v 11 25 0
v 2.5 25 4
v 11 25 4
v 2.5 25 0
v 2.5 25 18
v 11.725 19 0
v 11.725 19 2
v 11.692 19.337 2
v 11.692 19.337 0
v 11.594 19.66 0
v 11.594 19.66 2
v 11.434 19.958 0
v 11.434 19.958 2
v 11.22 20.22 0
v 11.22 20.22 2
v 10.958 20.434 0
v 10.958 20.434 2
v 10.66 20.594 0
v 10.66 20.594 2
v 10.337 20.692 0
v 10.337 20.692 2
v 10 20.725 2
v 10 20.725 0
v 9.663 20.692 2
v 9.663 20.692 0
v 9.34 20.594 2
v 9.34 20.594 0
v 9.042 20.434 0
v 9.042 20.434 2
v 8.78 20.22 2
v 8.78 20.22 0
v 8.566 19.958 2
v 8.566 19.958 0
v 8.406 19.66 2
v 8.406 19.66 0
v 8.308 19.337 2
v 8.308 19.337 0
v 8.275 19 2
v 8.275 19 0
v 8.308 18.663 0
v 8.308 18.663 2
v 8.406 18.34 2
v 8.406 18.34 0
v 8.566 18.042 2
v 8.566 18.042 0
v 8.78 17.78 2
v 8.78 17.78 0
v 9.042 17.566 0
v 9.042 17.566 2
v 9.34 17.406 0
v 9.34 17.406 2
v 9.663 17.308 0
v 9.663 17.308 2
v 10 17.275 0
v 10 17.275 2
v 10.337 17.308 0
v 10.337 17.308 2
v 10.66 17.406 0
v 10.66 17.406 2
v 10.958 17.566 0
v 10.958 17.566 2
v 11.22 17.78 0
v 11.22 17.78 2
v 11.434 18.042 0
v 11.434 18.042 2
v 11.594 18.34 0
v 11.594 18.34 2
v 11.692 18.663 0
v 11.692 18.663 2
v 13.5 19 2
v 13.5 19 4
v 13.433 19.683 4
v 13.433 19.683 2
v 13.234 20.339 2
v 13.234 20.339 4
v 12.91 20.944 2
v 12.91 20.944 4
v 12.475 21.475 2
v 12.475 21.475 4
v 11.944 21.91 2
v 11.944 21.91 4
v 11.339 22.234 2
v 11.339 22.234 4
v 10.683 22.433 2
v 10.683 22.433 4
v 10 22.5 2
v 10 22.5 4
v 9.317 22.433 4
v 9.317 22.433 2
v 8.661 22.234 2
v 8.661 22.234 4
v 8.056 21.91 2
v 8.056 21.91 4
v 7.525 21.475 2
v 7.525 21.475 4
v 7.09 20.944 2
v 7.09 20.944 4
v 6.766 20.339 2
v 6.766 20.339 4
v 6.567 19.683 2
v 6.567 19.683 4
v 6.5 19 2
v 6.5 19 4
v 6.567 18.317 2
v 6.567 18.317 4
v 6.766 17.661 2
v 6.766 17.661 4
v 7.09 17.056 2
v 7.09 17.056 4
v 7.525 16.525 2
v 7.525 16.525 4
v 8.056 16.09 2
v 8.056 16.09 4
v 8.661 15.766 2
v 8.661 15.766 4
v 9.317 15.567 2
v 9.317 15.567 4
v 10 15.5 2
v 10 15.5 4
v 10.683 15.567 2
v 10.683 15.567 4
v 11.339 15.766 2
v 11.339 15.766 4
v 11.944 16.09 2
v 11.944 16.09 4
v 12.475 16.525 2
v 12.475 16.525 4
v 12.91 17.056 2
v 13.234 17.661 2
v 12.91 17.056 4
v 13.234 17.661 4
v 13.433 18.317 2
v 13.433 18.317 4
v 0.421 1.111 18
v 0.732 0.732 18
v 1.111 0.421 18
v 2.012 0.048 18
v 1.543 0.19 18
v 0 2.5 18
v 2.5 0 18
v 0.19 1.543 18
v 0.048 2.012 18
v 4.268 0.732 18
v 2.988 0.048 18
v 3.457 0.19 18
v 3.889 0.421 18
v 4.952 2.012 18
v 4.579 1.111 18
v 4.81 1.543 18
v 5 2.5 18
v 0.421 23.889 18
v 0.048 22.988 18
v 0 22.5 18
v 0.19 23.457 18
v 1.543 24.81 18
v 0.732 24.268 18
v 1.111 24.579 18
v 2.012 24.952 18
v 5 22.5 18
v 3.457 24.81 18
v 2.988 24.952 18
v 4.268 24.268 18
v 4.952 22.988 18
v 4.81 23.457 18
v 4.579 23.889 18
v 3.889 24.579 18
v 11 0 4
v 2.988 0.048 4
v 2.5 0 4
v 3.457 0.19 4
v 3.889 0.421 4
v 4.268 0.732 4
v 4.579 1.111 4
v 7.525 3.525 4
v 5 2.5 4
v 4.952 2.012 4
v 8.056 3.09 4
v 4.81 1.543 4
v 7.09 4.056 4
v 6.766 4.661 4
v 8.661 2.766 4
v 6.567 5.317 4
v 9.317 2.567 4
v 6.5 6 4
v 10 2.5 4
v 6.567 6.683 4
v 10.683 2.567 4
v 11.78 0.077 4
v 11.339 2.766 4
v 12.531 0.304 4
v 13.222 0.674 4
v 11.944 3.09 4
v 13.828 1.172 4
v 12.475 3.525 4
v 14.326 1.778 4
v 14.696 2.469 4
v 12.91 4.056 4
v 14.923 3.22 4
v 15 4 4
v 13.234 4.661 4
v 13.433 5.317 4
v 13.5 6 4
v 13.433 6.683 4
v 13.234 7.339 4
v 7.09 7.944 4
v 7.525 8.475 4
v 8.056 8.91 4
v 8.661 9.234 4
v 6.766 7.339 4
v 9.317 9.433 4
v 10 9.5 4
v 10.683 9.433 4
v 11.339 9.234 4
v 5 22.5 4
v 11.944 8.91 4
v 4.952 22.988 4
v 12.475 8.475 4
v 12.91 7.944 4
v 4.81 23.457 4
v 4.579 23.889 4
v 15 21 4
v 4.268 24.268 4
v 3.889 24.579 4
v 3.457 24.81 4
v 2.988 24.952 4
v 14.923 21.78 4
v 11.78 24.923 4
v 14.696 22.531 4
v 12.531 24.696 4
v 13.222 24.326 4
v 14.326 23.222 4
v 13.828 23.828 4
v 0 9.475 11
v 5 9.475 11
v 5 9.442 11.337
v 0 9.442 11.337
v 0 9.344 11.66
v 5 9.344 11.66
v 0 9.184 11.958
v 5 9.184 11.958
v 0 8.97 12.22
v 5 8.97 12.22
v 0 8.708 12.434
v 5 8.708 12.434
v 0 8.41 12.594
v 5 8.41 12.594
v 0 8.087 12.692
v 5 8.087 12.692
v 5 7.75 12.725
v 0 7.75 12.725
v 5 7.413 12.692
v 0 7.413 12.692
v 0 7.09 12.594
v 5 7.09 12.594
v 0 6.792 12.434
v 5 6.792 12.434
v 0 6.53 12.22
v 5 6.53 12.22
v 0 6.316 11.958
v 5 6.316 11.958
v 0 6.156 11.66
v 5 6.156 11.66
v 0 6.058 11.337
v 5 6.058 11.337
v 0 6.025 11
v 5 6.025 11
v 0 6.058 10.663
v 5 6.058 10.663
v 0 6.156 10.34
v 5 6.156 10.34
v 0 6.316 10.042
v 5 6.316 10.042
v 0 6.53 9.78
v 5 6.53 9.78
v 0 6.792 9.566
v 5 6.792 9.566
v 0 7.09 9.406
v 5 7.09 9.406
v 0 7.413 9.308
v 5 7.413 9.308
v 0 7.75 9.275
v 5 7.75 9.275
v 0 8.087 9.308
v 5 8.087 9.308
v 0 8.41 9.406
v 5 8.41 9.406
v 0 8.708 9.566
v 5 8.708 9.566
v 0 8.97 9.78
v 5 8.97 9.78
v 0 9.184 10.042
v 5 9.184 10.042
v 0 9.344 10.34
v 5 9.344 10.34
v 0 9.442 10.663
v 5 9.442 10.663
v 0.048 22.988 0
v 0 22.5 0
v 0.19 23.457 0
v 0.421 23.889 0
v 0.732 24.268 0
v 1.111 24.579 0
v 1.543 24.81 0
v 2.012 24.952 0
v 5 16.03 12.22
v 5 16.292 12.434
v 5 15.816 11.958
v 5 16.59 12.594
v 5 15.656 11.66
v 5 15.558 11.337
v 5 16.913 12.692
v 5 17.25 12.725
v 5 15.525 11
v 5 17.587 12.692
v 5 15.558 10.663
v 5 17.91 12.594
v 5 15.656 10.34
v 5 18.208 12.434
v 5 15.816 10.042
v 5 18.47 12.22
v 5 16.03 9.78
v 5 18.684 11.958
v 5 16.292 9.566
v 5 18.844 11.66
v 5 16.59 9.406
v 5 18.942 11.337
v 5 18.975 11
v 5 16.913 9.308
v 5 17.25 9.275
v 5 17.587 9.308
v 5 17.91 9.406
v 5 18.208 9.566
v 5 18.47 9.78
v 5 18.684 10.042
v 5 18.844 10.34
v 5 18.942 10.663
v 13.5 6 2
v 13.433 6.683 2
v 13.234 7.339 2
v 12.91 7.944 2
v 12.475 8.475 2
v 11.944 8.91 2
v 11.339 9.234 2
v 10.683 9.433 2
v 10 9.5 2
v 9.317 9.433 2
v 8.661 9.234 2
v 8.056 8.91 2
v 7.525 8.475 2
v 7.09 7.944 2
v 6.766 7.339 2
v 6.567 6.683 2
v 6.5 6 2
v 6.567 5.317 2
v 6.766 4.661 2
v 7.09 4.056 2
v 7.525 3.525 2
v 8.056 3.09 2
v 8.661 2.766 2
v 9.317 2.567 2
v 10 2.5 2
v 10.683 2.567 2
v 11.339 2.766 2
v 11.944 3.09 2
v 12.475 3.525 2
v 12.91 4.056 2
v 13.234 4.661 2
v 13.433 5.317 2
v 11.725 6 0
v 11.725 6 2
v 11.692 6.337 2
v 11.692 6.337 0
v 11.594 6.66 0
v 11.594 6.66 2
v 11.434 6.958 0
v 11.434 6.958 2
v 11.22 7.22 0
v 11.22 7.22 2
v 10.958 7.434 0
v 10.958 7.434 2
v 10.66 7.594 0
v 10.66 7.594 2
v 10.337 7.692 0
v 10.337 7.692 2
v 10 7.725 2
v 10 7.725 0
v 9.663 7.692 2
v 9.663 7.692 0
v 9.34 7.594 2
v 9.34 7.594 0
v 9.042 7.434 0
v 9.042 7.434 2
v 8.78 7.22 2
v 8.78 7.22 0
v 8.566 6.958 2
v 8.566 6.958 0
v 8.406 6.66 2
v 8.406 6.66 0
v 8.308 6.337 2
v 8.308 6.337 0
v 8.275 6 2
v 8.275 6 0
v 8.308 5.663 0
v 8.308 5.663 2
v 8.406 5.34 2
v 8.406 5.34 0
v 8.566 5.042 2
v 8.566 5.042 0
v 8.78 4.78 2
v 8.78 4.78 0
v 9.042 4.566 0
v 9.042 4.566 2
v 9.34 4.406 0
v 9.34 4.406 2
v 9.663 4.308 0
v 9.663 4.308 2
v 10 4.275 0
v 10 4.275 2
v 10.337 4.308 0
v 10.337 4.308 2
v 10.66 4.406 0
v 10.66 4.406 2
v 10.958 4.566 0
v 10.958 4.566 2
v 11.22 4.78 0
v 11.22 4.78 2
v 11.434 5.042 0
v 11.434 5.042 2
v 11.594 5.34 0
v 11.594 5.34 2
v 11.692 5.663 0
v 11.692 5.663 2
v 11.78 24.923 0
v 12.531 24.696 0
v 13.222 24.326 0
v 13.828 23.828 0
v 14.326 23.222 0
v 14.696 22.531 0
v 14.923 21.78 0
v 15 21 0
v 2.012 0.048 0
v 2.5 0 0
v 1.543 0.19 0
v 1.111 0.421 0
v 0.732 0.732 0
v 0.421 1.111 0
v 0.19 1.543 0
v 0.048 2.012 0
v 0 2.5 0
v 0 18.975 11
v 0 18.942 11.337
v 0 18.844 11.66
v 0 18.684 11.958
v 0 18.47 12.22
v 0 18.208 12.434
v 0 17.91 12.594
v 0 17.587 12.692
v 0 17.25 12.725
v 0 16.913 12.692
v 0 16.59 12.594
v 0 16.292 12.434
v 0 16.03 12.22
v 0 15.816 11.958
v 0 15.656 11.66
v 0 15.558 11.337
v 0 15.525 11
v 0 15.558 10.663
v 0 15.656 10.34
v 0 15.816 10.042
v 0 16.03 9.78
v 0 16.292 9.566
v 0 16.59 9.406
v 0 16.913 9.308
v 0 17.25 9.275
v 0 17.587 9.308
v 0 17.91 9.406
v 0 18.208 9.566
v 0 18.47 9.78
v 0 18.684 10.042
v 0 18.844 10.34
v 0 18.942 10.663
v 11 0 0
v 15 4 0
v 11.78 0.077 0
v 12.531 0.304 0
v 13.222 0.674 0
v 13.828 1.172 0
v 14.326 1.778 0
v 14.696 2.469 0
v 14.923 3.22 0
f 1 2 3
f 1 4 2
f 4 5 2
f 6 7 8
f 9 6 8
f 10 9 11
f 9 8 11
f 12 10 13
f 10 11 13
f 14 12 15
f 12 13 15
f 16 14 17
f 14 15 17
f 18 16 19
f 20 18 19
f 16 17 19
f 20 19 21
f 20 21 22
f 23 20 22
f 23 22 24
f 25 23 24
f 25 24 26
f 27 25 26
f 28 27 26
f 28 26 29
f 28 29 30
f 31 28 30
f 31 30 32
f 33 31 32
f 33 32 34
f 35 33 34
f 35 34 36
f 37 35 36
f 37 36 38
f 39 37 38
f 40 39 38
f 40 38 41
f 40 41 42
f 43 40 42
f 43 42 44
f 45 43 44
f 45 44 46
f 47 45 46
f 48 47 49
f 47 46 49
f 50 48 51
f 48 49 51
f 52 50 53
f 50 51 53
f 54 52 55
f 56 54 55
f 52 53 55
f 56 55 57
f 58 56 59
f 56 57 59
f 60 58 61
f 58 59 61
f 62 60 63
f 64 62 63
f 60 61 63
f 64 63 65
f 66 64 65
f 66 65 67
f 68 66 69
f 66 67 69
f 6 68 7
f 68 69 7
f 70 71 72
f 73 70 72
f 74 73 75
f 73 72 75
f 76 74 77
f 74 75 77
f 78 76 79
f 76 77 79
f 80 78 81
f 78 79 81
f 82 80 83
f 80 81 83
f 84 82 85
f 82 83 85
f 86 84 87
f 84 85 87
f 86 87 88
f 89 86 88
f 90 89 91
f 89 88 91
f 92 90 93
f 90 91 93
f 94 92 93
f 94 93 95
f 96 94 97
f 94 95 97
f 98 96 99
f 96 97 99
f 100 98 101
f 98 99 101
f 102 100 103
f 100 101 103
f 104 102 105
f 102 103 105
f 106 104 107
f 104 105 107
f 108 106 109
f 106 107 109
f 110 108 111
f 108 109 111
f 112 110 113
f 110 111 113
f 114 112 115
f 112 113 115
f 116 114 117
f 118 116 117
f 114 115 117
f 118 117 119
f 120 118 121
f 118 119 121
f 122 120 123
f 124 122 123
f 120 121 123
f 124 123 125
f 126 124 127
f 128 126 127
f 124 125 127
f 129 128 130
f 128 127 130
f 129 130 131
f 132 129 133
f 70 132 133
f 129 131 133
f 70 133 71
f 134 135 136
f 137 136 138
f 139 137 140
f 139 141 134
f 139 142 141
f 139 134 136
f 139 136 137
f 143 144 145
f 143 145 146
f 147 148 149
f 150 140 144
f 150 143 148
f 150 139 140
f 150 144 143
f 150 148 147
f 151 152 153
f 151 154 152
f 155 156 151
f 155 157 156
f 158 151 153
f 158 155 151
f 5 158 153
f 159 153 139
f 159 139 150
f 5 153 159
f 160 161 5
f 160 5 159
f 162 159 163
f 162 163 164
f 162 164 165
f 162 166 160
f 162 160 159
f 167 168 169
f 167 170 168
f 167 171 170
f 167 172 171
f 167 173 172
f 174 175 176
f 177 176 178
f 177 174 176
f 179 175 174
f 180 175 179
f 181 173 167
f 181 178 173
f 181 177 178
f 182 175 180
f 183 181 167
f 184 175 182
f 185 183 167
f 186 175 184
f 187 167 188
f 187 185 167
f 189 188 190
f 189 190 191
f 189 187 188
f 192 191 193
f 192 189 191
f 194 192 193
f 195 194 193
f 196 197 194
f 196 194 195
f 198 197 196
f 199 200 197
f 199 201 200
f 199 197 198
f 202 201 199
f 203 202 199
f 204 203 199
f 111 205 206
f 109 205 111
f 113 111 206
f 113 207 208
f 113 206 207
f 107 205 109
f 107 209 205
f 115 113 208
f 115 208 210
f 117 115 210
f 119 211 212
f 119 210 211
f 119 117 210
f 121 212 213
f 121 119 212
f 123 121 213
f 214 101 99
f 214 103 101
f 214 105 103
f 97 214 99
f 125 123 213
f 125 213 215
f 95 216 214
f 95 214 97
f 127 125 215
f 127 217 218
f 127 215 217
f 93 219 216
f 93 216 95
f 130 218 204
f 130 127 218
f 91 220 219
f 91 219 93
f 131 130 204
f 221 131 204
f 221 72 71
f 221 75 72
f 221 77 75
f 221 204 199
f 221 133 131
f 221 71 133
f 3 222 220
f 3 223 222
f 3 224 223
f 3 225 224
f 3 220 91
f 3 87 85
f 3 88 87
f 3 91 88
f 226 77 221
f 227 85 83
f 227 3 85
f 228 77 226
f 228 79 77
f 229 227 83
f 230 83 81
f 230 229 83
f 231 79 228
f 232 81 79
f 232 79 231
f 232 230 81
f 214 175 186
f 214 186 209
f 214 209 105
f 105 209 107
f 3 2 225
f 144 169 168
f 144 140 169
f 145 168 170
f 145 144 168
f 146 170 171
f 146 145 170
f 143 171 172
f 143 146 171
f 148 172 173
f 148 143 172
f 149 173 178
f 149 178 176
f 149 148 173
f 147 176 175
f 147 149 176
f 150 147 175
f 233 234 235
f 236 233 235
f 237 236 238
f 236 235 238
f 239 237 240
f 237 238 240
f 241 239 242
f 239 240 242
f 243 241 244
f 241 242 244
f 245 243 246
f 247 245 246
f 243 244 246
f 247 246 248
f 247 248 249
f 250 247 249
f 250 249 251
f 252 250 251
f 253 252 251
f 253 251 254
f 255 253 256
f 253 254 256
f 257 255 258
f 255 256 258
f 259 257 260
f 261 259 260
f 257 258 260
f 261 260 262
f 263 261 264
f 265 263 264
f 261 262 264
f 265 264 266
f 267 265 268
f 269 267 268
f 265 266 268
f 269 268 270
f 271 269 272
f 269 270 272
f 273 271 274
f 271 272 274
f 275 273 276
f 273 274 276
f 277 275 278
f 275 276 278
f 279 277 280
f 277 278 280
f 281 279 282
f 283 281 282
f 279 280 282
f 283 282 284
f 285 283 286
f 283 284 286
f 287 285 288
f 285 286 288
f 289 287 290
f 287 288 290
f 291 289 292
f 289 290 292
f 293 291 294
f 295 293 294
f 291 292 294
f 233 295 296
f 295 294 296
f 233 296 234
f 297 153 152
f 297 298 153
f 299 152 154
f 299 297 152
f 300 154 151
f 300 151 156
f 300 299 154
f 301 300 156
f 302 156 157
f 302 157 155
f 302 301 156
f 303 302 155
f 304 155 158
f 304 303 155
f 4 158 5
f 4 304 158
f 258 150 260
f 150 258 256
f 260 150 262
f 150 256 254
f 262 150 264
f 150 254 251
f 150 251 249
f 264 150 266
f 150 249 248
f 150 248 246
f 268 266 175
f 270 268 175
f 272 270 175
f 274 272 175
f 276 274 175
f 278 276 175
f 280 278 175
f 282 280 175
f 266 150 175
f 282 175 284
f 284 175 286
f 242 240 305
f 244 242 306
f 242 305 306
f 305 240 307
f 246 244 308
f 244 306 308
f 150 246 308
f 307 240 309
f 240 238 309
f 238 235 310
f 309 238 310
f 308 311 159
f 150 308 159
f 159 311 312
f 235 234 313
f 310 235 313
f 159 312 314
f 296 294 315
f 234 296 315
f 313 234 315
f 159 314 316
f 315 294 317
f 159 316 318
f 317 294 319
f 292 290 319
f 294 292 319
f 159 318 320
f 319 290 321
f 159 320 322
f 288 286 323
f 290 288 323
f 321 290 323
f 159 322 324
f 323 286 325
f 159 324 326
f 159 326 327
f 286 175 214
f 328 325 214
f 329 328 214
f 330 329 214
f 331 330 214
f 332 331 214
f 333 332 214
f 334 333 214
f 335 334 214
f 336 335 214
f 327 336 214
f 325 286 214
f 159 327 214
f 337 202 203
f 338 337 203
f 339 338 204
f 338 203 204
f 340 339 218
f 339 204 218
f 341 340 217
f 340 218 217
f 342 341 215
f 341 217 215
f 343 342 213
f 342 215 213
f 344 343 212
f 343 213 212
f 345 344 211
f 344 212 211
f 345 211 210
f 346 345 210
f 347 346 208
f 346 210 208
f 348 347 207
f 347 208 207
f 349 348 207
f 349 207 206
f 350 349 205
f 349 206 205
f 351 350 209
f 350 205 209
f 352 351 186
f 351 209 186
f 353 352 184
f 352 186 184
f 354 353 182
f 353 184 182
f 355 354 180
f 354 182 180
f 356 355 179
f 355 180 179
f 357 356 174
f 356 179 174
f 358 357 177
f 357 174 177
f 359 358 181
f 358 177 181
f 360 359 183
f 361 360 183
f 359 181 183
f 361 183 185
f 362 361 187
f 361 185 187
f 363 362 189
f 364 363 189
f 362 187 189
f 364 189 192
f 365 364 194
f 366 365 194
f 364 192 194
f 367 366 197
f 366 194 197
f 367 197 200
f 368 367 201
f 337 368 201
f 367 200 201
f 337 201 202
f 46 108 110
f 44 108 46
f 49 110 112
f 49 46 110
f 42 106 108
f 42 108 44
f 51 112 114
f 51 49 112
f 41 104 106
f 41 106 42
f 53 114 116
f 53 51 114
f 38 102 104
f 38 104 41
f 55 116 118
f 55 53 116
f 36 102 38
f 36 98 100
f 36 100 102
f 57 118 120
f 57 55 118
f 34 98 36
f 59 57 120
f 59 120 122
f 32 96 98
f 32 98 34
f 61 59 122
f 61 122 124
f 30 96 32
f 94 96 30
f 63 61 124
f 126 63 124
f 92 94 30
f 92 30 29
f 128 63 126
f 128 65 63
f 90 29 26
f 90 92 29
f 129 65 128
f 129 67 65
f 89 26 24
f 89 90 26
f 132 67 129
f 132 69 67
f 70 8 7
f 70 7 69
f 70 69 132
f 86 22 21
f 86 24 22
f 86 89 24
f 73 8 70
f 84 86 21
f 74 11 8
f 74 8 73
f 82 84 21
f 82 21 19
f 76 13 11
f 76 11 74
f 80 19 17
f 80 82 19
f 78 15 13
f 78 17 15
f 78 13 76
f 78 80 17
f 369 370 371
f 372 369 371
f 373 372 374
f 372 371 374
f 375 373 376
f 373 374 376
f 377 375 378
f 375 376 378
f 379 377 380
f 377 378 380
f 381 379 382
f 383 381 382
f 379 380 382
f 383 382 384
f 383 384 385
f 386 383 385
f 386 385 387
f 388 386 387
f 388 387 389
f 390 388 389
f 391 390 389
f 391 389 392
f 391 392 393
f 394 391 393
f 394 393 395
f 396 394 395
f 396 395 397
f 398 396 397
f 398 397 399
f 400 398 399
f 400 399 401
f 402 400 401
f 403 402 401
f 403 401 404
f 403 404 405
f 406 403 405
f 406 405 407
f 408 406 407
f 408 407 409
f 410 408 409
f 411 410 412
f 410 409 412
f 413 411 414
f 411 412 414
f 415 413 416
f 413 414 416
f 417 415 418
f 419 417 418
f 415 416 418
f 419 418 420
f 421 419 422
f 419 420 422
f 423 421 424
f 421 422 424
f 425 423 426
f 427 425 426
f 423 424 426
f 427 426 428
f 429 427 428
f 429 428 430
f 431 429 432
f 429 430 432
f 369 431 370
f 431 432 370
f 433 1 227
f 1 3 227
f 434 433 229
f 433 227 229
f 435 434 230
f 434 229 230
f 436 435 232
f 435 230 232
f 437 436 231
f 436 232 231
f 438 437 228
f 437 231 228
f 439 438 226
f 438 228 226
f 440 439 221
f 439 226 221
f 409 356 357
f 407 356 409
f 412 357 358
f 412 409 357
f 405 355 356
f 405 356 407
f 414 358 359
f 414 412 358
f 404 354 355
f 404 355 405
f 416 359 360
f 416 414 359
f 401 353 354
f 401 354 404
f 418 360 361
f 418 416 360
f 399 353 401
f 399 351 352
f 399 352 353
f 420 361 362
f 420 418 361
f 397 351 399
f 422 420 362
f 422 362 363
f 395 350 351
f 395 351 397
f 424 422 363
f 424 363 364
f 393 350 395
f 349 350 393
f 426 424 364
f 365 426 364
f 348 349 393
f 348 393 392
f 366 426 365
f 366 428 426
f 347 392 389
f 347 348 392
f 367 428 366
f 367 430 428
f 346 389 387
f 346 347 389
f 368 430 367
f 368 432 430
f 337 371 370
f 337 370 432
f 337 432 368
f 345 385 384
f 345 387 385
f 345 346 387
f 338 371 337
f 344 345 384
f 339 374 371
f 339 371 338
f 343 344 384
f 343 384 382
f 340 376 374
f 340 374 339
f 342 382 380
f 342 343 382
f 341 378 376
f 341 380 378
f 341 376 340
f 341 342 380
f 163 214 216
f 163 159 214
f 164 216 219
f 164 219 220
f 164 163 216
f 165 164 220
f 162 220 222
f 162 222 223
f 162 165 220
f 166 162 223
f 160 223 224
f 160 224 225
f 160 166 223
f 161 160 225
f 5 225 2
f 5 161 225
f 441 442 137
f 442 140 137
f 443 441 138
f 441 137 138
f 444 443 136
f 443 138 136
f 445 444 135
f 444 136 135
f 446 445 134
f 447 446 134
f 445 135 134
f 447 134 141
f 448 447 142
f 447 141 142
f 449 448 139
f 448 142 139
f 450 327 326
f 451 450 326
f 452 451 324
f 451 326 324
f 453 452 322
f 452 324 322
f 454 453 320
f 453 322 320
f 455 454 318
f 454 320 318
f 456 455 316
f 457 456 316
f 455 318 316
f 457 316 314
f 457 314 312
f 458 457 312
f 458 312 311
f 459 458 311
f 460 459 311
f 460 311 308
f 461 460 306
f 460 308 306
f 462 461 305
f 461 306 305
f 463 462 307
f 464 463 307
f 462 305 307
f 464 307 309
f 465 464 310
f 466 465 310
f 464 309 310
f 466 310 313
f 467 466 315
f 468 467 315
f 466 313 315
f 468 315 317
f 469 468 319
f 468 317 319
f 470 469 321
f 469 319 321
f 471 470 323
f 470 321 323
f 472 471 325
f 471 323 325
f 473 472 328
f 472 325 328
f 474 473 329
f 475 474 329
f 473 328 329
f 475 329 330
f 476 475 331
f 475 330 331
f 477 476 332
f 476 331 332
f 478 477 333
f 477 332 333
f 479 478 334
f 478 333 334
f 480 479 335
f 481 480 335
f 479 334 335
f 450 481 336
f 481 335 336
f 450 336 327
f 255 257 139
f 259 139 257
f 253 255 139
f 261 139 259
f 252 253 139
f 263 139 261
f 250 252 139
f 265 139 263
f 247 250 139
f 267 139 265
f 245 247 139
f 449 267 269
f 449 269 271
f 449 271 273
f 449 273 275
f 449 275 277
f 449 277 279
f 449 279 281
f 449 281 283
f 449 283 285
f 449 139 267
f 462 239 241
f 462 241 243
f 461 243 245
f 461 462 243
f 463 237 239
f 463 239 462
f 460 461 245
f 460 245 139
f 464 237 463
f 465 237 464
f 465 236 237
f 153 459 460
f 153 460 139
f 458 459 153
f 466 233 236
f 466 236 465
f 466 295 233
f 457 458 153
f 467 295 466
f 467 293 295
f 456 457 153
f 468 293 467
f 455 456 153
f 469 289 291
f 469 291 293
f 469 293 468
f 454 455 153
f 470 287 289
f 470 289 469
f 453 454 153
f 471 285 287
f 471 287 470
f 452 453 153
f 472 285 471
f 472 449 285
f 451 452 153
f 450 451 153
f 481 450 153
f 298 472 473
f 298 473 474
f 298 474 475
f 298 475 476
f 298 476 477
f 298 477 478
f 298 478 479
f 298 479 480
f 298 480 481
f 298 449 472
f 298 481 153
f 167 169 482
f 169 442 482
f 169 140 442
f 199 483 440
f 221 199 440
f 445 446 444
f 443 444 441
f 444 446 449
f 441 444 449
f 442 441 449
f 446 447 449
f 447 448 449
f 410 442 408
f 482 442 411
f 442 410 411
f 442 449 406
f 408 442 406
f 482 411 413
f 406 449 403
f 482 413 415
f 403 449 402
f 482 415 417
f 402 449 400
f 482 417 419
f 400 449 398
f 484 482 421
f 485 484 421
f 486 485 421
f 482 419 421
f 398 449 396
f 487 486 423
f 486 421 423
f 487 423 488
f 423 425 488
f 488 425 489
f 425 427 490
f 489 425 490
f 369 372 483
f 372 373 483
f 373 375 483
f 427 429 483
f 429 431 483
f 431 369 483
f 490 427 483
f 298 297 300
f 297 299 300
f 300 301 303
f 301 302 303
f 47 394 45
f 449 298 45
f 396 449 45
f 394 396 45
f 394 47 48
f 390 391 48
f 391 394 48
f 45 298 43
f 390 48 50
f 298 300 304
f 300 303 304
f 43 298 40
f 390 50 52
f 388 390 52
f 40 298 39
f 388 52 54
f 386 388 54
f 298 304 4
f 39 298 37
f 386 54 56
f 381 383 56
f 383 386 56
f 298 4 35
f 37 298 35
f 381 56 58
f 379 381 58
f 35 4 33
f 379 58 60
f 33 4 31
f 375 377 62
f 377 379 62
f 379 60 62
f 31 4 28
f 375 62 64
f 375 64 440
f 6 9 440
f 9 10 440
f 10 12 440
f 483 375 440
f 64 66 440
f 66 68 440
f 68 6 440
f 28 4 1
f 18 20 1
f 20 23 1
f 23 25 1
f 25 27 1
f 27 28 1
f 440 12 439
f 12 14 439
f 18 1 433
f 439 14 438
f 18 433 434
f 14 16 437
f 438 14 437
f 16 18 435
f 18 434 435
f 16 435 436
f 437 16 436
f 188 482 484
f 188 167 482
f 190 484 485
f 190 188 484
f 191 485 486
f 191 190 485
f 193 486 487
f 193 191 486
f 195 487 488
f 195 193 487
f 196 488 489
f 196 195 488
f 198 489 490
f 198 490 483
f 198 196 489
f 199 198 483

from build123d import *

# Parameters (mm, degrees)
F0_W     = 15
F0_H     = 25
F1_DEPTH = 4
F2_W     = 5
F2_H     = 25
F3_DEPTH = 14
F4_R     = 3.5
F4_R_2   = 1.725
F5_DEPTH = 2
F6_DEPTH = 4
F7_R     = 1.725
F8_DEPTH = 5
F9_R     = 4
F10_R    = 2.49999


# Not quite as in the source:
# - a fillet or chamfer is up to 0.001 mm smaller than in the source, because OpenCascade refuses the exact size


with BuildPart() as f1:
    # F0 (on Top) → F1 (new body)
    with BuildSketch(Plane.XY):
        with Locations((7.5, 12.5)):
            Rectangle(F0_W, F0_H)
    extrude(amount=F1_DEPTH)

    # F2 (on face) → F3 (join)
    with BuildSketch(Plane.XY.offset(4)):
        with Locations((2.5, 12.5)):
            Rectangle(F2_W, F2_H)
    extrude(amount=F3_DEPTH)

    # F4 (on face) → F5 (cut)
    with BuildSketch(Plane.XY.offset(4)):
        with Locations((10, 19)):
            Circle(F4_R)
        with Locations((10, 19)):
            Circle(F4_R_2, mode=Mode.SUBTRACT)
        with Locations((10, 6)):
            Circle(F4_R)
        with Locations((10, 6)):
            Circle(F4_R_2, mode=Mode.SUBTRACT)
    extrude(amount=-F5_DEPTH, mode=Mode.SUBTRACT)

    # F4 (on face) → F6 (cut, through all)
    with BuildSketch(Plane.XY.offset(4)):
        with Locations((10, 19)):
            Circle(F4_R_2)
        with Locations((10, 6)):
            Circle(F4_R_2)
    extrude(amount=-F6_DEPTH, mode=Mode.SUBTRACT)

    # F7 (on face) → F8 (cut, through all)
    with BuildSketch(Plane.YZ.offset(5)):
        with Locations((7.75, 11)):
            Circle(F7_R)
        with Locations((17.25, 11)):
            Circle(F7_R)
    extrude(amount=-F8_DEPTH, mode=Mode.SUBTRACT)

    # F9
    f9_edges = [f1.edges().sort_by_distance(p)[0] for p in [
        (15, 0, 2),
        (15, 25, 2),
    ]]
    fillet(f9_edges, radius=F9_R)

    # F10 (radius 2.5 in the source; OpenCascade refuses exactly that, so slightly less here)
    f10_edges = [f1.edges().sort_by_distance(p)[0] for p in [
        (0, 0, 9),
        (0, 25, 9),
        (5, 25, 11),
        (5, 0, 11),
    ]]
    fillet(f10_edges, radius=F10_R)


solid = f1.part
